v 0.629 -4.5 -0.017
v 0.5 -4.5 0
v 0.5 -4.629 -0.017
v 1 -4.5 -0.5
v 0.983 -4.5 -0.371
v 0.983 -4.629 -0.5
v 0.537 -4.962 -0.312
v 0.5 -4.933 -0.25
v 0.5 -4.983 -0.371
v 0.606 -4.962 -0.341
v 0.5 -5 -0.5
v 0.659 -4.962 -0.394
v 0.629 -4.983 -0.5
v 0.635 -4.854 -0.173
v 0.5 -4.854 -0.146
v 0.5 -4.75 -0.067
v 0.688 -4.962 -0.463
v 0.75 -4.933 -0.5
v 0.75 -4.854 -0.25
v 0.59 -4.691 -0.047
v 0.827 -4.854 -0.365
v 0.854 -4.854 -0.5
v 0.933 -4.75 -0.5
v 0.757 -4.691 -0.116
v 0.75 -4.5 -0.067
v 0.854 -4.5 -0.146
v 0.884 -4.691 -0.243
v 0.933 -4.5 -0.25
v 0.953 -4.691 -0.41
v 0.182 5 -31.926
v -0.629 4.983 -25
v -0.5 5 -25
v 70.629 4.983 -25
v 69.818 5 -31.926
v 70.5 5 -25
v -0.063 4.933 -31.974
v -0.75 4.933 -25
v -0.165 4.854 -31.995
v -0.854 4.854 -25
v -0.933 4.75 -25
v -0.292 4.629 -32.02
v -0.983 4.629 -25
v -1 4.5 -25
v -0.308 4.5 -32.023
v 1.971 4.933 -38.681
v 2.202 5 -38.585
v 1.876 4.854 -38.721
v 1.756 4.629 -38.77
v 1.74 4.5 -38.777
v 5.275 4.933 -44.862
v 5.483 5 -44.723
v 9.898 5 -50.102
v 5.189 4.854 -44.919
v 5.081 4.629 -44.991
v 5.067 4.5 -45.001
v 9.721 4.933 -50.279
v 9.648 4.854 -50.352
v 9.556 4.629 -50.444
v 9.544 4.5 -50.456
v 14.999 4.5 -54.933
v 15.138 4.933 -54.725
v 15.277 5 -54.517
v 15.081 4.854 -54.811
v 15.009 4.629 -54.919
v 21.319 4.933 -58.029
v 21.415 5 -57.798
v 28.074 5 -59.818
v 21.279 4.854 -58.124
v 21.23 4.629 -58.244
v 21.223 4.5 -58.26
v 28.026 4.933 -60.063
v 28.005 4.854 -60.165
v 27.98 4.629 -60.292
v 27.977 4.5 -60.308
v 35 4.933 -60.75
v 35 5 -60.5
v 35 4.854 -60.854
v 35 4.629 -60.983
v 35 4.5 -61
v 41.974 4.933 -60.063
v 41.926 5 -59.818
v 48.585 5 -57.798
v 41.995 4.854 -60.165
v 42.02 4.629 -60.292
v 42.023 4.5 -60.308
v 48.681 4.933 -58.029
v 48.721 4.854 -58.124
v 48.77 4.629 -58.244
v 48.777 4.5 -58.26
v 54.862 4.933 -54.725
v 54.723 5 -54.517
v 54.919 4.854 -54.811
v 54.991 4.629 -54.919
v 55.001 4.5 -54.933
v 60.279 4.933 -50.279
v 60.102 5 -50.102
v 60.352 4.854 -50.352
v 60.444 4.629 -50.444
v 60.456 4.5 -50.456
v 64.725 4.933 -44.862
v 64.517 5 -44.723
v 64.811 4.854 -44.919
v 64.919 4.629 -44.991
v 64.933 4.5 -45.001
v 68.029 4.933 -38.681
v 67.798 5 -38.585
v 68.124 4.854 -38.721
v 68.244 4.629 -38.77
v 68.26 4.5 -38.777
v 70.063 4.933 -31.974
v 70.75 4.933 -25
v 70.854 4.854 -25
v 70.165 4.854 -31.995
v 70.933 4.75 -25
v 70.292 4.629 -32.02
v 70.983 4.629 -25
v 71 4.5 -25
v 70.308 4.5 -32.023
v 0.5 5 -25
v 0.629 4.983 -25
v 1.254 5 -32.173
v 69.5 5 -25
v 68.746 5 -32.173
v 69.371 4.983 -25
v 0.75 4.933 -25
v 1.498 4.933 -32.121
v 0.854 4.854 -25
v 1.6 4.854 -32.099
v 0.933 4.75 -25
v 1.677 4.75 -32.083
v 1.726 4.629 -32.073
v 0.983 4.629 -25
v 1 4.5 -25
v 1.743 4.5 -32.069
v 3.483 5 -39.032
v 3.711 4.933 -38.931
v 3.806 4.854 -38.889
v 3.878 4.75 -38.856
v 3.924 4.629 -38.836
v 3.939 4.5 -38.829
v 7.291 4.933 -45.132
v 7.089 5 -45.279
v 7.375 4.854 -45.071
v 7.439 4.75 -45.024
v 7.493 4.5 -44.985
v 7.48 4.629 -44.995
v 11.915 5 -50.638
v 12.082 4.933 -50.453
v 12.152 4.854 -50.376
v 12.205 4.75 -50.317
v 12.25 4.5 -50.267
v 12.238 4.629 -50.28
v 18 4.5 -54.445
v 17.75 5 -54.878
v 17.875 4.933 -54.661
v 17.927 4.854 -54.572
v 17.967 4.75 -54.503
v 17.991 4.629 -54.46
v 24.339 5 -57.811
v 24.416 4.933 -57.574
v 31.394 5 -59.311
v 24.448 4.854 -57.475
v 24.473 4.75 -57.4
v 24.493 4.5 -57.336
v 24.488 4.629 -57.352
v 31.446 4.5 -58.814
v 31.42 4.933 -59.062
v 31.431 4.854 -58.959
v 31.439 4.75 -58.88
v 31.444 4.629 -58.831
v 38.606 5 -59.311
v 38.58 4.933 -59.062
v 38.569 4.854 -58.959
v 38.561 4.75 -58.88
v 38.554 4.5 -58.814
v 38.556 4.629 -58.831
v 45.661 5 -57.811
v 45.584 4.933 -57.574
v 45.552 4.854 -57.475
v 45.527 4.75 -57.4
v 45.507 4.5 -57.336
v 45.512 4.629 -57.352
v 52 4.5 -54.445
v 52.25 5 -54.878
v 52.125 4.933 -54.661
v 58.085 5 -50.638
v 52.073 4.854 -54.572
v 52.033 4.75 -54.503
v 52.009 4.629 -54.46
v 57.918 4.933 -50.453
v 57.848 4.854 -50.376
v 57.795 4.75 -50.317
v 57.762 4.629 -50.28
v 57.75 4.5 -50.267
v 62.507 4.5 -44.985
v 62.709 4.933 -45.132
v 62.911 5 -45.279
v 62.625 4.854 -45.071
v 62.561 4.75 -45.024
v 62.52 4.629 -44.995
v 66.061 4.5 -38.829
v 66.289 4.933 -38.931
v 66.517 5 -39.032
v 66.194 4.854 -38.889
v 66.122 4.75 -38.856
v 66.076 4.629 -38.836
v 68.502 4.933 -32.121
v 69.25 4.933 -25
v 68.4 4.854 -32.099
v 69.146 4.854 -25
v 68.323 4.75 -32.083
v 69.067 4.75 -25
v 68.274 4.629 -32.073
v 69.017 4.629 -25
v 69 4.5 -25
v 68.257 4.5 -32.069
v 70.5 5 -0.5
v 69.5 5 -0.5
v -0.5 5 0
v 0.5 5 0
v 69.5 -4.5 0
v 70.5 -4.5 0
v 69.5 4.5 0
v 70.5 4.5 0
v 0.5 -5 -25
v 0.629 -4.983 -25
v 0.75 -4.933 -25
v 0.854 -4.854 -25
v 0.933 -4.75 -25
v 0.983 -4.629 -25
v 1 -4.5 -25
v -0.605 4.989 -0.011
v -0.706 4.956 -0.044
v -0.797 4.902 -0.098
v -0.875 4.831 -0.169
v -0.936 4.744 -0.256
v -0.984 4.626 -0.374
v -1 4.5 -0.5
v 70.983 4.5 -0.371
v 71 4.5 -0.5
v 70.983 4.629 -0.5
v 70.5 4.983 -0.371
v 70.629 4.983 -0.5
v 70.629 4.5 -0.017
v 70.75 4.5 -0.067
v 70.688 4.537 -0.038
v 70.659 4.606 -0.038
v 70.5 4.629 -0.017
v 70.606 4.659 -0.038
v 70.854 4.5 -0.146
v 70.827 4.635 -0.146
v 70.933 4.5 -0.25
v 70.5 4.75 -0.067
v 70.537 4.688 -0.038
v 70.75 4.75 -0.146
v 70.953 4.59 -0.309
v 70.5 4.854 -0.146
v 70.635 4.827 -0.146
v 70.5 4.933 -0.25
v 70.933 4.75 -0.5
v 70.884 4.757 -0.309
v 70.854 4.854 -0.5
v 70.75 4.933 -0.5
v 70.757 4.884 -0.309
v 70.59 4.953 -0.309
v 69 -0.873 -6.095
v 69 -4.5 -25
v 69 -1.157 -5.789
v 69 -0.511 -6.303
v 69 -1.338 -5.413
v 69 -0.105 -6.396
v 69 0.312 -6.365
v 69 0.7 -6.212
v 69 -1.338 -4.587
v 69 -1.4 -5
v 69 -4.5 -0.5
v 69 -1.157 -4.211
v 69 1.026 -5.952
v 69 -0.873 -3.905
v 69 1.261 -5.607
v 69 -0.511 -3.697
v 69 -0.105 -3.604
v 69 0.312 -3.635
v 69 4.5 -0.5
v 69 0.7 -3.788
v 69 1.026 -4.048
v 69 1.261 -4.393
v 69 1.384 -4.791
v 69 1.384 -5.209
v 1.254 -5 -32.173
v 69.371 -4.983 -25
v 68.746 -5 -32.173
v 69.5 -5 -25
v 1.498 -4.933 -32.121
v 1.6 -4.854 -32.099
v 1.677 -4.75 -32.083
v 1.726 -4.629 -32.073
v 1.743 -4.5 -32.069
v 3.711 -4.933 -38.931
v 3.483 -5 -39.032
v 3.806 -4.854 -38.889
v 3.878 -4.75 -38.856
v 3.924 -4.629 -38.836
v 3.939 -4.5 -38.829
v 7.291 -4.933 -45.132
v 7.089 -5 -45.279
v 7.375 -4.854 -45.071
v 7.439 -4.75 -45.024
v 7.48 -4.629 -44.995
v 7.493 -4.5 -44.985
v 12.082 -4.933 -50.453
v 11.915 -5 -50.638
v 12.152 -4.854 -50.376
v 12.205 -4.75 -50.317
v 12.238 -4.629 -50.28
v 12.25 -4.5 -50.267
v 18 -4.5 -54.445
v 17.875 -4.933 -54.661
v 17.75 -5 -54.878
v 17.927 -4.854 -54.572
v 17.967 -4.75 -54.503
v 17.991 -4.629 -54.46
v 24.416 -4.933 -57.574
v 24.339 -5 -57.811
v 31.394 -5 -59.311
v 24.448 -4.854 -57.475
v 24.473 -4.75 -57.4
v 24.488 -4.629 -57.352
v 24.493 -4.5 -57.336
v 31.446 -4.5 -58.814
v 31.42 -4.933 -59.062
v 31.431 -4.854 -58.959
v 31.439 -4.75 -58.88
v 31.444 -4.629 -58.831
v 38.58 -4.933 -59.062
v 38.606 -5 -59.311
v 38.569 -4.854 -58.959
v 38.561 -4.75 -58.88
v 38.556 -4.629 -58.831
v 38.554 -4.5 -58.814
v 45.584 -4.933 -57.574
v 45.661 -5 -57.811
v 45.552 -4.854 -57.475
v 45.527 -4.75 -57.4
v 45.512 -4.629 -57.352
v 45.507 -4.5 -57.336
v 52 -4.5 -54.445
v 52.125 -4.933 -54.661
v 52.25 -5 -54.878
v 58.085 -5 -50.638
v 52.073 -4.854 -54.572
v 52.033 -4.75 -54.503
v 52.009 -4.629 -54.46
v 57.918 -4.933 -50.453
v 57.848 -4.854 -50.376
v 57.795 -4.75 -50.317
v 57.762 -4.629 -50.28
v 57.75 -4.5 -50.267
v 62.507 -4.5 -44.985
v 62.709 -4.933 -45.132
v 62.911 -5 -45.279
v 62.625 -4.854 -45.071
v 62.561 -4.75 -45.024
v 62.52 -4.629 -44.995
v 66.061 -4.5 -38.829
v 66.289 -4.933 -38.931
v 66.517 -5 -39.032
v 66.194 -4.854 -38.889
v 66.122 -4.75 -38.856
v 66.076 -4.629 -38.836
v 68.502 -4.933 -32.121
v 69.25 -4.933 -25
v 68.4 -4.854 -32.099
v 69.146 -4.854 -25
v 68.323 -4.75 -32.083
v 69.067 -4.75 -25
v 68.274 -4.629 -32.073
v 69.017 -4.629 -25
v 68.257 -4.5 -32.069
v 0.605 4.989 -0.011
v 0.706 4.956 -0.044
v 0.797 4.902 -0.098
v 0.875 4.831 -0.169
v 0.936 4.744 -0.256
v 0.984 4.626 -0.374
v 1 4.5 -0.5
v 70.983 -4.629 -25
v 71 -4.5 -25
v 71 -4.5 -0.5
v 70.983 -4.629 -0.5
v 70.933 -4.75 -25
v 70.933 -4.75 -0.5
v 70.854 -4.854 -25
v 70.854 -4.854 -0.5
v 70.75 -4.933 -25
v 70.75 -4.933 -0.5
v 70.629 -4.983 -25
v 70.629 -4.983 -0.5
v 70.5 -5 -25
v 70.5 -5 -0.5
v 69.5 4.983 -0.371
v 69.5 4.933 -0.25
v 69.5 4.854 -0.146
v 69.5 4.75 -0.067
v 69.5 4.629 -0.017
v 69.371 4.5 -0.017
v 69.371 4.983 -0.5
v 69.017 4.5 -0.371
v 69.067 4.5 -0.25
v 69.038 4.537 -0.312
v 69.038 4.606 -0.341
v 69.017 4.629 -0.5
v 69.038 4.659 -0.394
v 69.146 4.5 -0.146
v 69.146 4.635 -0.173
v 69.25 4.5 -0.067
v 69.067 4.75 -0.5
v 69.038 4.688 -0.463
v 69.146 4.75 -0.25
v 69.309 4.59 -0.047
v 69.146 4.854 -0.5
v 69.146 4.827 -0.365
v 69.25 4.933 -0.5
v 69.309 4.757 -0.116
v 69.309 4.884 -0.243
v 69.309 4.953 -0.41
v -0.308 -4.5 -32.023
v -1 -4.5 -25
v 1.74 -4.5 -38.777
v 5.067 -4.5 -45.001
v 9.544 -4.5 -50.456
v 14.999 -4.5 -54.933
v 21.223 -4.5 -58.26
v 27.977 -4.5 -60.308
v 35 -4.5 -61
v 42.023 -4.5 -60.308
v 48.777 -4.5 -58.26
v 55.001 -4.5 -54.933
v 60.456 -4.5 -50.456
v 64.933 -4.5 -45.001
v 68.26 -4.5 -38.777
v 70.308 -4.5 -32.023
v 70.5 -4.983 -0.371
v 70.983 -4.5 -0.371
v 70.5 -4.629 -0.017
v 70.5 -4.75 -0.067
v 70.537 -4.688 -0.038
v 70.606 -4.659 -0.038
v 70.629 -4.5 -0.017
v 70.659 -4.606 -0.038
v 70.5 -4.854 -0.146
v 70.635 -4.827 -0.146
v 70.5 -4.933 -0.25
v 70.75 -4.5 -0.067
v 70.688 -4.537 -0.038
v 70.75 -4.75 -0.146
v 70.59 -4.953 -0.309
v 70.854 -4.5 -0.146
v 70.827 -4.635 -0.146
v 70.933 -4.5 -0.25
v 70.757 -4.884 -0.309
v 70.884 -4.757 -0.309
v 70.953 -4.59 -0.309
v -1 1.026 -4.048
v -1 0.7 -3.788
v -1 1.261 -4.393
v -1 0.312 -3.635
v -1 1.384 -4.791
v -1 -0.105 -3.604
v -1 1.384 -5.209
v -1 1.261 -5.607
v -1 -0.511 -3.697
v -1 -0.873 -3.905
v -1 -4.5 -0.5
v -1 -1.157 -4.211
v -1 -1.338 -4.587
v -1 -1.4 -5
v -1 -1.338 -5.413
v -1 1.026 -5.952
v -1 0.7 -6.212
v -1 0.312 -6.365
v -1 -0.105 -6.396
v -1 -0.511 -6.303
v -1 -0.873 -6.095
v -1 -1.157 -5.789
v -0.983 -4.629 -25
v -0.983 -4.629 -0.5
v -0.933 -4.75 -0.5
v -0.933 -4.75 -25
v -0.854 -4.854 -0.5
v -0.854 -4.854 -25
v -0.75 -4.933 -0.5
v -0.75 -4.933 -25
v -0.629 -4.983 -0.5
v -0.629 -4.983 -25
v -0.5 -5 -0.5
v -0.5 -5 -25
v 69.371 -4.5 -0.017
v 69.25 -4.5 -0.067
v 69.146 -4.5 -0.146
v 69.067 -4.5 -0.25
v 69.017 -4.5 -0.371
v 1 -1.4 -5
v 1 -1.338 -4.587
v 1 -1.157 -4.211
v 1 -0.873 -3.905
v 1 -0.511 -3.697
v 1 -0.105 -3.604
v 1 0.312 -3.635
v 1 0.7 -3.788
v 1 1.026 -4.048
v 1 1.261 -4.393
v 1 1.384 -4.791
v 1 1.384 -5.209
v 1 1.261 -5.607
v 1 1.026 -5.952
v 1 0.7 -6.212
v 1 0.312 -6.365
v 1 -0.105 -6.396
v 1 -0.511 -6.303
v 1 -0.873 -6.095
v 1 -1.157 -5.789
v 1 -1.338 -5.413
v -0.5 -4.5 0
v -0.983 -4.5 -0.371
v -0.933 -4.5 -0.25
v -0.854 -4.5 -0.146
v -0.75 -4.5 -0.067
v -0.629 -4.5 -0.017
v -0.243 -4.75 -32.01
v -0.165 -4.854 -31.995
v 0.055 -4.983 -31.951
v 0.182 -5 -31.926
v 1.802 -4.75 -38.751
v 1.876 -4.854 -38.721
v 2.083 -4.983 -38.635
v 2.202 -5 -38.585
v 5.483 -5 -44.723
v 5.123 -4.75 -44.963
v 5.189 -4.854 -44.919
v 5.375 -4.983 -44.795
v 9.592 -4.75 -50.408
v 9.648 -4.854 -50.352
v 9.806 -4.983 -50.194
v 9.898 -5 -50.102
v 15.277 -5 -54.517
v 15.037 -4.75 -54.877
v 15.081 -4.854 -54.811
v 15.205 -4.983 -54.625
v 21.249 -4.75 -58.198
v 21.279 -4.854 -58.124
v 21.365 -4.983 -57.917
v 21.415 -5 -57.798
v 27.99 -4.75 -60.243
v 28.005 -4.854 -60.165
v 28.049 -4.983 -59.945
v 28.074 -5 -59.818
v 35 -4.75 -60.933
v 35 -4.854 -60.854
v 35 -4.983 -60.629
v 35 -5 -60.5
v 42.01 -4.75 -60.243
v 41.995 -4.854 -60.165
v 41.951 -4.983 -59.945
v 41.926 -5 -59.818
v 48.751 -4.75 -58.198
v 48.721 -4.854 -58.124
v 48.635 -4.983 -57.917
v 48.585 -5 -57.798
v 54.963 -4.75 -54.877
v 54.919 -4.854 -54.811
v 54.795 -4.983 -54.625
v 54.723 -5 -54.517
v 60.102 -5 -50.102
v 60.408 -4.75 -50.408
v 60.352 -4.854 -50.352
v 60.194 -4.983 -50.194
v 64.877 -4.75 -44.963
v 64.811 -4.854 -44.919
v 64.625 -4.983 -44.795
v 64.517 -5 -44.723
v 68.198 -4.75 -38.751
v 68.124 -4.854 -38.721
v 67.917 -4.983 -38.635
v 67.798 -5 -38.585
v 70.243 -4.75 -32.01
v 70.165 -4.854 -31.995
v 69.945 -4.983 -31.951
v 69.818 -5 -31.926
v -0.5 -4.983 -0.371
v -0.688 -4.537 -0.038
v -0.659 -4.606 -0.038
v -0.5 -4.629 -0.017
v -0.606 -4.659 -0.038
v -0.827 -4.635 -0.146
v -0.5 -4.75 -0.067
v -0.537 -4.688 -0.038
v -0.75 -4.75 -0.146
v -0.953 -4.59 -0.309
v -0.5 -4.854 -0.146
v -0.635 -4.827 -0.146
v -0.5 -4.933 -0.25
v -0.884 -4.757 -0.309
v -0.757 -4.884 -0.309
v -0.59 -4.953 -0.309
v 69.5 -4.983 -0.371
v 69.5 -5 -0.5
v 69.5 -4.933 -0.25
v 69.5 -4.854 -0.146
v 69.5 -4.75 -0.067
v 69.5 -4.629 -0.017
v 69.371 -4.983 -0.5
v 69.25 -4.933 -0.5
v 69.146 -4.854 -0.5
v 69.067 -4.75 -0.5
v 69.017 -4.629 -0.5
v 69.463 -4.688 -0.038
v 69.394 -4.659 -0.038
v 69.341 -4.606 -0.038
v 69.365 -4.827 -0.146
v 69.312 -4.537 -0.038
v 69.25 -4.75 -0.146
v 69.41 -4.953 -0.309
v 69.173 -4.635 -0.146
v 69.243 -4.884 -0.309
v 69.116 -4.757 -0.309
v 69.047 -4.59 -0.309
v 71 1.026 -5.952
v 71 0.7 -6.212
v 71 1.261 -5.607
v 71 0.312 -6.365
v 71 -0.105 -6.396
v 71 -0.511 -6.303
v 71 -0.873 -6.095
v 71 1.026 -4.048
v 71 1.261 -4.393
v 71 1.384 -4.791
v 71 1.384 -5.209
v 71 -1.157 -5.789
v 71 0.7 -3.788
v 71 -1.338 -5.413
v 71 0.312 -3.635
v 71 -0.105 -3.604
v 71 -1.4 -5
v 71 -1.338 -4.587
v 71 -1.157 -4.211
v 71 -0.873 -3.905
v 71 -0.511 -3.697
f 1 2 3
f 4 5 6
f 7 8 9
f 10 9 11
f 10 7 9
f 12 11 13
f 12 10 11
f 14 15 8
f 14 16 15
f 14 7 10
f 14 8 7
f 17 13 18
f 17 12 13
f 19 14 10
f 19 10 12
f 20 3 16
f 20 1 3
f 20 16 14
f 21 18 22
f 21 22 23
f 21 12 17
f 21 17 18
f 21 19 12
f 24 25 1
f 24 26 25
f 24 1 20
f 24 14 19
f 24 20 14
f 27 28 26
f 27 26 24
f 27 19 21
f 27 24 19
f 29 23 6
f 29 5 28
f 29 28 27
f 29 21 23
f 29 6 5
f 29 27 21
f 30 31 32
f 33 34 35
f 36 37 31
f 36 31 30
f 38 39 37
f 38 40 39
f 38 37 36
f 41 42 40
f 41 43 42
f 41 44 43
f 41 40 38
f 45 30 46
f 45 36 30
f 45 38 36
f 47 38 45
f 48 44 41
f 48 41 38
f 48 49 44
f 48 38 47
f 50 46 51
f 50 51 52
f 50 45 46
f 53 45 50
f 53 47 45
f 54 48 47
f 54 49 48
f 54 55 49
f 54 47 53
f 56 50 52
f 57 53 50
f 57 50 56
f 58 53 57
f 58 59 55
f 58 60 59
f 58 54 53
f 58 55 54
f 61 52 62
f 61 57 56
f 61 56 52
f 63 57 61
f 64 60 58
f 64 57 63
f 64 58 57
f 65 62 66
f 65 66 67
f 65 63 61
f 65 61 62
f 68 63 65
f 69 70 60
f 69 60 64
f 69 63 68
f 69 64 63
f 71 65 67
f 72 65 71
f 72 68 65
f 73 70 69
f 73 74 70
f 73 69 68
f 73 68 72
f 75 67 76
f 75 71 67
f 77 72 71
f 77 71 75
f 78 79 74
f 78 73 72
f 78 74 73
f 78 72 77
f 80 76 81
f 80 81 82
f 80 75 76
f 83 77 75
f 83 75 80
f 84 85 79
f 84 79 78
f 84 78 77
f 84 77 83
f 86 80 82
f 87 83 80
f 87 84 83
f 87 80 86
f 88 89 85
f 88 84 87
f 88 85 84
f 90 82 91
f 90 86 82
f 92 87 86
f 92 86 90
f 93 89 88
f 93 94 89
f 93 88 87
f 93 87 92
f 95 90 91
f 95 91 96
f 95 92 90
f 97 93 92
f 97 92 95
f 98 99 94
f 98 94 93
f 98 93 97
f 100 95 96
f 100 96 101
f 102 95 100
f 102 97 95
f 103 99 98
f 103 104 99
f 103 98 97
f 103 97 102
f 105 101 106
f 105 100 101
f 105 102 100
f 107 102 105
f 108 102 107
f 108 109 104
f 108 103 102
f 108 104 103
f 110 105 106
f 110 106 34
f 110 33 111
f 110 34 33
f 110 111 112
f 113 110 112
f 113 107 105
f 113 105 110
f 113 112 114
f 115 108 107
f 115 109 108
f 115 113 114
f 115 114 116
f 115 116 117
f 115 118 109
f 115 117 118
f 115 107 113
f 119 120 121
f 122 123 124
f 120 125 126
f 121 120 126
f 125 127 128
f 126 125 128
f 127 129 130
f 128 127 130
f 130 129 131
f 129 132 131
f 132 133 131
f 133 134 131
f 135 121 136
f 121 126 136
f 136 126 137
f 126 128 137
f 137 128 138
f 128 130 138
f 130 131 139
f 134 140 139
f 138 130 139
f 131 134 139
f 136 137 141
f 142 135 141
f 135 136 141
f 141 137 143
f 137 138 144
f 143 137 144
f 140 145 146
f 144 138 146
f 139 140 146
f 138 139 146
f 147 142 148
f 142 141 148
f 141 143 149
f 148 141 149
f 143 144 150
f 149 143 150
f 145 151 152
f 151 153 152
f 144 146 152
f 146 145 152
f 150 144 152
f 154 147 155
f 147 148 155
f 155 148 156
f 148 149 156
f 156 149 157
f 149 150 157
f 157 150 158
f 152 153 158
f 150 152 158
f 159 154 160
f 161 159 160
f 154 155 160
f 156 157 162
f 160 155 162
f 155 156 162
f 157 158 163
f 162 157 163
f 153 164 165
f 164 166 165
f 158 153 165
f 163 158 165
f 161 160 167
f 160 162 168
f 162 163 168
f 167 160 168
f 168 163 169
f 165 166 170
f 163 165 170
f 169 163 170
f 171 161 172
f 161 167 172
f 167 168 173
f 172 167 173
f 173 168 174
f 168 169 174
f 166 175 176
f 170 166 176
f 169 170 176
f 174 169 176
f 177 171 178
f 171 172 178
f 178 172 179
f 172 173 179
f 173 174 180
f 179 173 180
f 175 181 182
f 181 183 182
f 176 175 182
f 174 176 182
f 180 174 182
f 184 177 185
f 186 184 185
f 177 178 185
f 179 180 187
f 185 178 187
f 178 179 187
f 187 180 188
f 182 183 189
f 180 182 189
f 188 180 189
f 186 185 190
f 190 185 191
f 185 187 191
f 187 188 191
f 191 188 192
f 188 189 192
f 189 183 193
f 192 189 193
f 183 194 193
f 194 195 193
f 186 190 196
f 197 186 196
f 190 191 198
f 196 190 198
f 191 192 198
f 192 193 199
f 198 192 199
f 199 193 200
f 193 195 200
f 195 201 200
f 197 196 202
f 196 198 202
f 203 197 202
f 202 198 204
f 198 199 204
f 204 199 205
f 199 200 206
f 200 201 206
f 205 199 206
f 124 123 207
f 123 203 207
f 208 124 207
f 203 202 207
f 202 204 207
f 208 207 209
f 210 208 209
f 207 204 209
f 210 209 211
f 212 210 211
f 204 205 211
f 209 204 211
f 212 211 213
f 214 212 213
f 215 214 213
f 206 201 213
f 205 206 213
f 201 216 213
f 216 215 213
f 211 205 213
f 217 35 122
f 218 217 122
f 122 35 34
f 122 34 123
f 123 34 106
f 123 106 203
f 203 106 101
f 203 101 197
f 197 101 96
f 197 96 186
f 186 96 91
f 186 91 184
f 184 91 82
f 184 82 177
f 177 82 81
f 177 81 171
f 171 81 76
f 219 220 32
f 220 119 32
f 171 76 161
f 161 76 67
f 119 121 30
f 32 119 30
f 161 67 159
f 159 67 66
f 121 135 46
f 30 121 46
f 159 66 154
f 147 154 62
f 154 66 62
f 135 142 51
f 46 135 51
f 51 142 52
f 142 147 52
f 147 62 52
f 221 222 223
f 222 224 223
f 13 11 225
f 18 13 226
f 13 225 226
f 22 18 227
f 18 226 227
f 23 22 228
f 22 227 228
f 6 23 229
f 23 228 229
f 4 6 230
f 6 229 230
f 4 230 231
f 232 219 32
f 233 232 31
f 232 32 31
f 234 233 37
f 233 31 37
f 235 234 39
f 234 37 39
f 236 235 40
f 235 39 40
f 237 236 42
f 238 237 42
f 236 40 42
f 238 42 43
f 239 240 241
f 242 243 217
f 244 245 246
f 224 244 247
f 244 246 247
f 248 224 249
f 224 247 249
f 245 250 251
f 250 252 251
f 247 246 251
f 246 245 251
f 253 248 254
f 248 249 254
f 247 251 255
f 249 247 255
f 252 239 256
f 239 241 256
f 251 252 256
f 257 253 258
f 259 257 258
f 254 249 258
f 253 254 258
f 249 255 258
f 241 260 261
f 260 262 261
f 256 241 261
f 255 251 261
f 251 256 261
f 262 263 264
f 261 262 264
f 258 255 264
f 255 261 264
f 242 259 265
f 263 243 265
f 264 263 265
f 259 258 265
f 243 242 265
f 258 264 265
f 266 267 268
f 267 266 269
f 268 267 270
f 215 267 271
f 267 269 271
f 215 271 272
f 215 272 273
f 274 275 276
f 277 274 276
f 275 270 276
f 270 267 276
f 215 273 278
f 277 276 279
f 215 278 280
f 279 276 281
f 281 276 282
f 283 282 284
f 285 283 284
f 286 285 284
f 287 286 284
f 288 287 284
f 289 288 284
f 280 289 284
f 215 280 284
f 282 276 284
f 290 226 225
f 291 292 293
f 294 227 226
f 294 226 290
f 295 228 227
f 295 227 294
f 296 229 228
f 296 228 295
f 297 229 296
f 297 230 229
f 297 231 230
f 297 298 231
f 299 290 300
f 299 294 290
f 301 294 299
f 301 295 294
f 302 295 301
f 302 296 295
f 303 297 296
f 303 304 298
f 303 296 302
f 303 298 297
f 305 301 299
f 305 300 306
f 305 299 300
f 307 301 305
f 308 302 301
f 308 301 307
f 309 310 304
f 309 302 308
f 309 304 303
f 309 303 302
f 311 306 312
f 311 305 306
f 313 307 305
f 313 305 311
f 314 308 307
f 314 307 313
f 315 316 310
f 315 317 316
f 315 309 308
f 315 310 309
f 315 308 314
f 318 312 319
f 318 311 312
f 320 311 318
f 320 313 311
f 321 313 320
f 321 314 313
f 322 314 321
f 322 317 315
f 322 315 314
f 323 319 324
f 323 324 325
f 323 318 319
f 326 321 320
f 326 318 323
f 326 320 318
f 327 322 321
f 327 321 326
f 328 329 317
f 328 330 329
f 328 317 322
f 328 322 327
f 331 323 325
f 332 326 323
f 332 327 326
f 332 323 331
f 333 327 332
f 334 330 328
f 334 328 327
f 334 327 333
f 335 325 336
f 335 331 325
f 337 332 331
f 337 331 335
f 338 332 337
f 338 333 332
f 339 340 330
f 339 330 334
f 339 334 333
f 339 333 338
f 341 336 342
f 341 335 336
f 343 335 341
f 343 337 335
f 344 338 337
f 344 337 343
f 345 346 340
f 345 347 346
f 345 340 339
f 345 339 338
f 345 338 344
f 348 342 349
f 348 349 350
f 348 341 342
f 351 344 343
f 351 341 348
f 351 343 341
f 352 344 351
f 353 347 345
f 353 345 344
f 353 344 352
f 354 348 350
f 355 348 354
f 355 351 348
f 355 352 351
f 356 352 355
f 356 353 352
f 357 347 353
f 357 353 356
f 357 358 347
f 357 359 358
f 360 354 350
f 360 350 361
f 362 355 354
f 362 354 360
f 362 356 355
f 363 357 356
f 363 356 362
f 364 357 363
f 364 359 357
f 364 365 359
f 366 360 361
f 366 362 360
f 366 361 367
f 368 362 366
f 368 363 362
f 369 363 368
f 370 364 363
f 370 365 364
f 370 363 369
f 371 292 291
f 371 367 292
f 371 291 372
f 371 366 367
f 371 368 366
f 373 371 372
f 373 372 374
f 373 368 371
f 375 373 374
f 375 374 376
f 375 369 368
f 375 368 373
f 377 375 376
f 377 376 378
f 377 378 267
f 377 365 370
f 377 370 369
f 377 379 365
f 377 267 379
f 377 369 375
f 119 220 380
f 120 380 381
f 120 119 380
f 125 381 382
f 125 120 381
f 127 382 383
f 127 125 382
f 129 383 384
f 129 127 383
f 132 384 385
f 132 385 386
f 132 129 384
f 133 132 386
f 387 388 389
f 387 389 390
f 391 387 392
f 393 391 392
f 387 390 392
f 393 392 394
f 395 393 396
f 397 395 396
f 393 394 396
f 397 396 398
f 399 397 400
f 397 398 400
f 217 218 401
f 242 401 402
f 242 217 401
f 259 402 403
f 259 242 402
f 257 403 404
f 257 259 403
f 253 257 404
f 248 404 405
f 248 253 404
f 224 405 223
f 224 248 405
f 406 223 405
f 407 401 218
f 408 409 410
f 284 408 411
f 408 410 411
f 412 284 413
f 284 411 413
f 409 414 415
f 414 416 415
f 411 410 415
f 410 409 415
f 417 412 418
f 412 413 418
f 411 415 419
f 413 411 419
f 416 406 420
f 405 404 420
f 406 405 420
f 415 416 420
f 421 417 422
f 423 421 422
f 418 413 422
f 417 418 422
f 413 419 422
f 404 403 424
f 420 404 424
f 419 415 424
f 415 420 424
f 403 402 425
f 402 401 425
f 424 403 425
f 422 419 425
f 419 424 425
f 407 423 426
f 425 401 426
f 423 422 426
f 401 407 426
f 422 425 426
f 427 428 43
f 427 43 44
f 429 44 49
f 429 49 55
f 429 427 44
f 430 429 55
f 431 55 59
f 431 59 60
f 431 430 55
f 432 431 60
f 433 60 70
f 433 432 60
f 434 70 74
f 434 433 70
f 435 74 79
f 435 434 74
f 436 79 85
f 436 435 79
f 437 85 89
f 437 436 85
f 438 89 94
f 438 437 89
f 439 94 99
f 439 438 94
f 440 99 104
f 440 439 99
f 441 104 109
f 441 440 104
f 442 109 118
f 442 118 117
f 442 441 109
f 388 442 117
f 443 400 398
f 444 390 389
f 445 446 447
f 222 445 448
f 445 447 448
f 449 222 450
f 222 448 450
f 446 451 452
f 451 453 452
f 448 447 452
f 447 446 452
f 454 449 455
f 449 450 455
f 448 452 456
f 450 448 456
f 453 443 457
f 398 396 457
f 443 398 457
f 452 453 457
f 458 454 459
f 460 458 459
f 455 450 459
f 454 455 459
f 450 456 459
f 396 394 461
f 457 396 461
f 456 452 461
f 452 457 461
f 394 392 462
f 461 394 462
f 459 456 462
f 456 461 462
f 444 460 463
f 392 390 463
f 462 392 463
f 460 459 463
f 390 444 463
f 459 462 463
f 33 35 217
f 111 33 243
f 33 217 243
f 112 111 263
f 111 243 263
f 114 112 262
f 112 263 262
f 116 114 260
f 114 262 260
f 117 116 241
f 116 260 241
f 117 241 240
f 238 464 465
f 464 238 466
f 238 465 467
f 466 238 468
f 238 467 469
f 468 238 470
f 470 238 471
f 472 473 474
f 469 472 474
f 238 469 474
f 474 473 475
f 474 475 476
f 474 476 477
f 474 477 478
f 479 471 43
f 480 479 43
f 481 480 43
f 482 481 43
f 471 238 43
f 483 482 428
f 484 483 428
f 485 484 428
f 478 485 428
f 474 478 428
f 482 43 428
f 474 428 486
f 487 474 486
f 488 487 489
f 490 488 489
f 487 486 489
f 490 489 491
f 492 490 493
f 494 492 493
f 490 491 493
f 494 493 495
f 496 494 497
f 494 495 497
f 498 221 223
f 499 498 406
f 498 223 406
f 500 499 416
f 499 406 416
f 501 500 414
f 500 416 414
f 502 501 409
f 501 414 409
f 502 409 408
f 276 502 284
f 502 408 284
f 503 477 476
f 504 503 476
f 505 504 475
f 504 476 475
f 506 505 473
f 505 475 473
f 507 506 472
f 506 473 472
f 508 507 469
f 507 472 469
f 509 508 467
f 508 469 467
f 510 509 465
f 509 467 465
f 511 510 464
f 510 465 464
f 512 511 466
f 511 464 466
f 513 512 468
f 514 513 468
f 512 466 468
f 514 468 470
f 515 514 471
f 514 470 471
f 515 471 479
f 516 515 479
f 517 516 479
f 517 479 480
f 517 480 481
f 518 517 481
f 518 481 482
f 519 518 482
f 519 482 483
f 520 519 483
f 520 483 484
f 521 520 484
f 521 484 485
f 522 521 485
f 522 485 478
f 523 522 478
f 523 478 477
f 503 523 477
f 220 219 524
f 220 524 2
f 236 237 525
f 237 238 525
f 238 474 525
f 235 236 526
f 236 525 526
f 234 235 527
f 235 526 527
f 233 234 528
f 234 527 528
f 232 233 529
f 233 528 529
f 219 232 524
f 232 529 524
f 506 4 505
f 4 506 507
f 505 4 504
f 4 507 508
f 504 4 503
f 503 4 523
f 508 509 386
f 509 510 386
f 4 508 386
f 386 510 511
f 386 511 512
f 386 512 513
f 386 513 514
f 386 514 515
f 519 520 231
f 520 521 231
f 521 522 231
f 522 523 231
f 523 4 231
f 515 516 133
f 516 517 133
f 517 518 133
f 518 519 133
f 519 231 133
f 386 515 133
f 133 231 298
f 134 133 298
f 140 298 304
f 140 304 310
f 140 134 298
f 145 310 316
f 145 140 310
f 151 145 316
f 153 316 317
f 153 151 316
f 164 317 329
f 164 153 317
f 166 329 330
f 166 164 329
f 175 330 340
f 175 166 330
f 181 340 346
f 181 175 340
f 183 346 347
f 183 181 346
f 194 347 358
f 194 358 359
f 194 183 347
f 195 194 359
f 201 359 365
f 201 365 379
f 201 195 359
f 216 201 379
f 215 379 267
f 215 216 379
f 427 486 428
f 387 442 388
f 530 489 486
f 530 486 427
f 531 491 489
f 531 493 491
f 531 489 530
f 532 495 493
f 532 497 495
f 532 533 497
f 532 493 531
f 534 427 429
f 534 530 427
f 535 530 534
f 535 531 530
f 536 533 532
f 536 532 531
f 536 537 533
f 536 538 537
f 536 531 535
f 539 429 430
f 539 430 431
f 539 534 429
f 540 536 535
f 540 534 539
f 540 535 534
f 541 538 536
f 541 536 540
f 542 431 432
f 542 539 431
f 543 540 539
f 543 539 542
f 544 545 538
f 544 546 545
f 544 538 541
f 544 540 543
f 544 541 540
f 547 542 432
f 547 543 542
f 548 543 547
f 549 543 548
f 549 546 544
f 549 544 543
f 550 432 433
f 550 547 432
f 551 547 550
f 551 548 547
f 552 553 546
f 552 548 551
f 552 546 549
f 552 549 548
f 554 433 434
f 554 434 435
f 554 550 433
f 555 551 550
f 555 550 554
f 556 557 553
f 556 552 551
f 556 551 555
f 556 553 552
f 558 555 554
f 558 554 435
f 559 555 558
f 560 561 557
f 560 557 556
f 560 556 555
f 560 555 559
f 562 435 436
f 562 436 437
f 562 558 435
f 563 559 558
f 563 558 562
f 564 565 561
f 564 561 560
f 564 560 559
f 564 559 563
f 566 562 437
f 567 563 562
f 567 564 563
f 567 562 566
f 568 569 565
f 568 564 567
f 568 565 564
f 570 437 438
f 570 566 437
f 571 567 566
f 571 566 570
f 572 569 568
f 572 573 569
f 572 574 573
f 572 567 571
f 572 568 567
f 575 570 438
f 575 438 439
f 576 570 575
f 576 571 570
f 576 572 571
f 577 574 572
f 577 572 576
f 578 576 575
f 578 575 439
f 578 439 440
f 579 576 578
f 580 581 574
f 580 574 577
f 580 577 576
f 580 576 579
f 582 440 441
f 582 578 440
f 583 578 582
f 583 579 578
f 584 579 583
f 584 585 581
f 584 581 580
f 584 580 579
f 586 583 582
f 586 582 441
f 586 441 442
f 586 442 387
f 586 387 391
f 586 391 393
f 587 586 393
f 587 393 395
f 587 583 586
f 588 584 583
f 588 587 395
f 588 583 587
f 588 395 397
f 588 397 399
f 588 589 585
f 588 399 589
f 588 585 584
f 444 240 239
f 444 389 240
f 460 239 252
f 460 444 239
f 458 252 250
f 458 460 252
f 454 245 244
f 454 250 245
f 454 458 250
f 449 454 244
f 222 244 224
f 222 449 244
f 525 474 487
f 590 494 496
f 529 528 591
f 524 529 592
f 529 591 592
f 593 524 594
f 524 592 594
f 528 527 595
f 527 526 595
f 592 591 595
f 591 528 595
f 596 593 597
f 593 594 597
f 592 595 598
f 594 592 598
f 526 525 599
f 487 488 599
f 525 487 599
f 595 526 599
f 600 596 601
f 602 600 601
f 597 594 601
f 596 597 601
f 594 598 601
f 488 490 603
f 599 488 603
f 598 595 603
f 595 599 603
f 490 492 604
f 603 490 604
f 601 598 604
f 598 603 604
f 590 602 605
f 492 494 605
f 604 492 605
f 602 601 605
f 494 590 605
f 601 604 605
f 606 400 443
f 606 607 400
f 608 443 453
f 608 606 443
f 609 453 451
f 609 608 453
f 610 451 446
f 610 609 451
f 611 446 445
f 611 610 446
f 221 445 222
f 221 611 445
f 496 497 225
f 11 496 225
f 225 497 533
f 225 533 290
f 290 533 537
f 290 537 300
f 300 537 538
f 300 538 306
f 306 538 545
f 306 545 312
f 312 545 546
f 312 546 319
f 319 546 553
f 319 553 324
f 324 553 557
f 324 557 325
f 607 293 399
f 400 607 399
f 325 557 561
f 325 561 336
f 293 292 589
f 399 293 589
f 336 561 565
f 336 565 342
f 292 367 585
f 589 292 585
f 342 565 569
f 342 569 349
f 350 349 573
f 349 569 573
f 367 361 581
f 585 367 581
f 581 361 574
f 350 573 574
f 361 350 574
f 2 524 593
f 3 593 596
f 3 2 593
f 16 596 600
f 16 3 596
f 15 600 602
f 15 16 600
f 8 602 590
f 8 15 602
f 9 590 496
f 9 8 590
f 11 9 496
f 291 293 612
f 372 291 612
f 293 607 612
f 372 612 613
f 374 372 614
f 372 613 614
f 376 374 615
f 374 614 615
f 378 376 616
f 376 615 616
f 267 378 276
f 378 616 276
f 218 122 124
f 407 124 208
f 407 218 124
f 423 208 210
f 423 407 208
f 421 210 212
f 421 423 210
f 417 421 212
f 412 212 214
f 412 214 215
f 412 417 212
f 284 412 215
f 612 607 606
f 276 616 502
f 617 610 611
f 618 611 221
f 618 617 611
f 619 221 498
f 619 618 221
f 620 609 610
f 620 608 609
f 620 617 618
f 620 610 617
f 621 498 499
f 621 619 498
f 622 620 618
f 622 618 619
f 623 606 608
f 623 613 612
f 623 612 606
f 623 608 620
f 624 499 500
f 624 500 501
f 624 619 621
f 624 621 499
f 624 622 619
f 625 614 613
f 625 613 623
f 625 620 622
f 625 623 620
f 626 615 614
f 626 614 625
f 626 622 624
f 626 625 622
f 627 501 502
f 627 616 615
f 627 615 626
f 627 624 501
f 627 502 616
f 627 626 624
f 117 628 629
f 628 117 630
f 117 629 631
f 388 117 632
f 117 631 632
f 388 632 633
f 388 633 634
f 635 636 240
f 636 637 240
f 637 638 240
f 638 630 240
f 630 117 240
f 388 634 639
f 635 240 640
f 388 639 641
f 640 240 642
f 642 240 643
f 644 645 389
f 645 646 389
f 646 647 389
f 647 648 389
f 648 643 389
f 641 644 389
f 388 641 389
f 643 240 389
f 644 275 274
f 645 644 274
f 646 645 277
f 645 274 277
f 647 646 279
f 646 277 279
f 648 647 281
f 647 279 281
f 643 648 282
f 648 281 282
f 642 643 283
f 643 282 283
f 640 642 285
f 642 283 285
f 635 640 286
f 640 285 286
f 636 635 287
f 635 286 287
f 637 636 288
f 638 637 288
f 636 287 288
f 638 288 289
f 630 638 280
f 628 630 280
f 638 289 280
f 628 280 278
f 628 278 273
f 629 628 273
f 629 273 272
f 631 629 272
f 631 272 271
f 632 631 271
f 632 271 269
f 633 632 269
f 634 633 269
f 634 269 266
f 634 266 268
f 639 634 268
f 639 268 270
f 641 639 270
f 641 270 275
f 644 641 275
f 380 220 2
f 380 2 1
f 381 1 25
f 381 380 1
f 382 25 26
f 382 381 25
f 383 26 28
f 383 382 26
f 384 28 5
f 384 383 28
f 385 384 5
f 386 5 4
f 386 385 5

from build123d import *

# Parameters (mm, degrees)
SZKIC3_W                   = 2
SZKIC3_H                   = 10
SZKIC5_R                   = 1.4
WYTNIJ_WYCI_GNI_CIE1_DEPTH = 100
ZAOKR_GLENIE1_R            = 0.5


with BuildPart() as part:
    # Wyciągnięcie po ścieżce1: sweep along a path in Szkic2
    with BuildLine(Plane(origin=(0, 0, 0), x_dir=(1, 0, 0), z_dir=(0, 1, 0))) as wyci_gni_cie_po_cie_ce1_path:
        Line((0, 0), (0, 25))
        ThreePointArc((0, 25), (35, 60), (70, 25))
        Line((70, 25), (70, 0))
    # Szkic3 → Wyciągnięcie po ścieżce1 (sweep)
    with BuildSketch(Plane.XY):
        Rectangle(SZKIC3_W, SZKIC3_H)
    sweep(path=wyci_gni_cie_po_cie_ce1_path.line)

    # Szkic5 → Wytnij-wyciągnięcie1 (cut)
    with BuildSketch(Plane.ZY.offset(1)):
        with Locations(Location((-5, 0, 0), (0, 0, 270))):
            Circle(SZKIC5_R)
    extrude(amount=-WYTNIJ_WYCI_GNI_CIE1_DEPTH, mode=Mode.SUBTRACT)

    # Zaokrąglenie1
    zaokr_glenie1_edges = [part.edges().sort_by_distance(p)[0] for p in [
        (35, -5, -61),
        (35, 5, -61),
        (1, 0, 0),
        (-1, 0, 0),
        (0, -5, 0),
        (1, -5, -12.5),
        (35, -5, -59),
        (70, -5, 0),
        (71, -5, -12.5),
        (71, 0, 0),
        (71, 5, -12.5),
        (70, 5, 0),
        (69, 0, 0),
        (69, -5, -12.5),
        (69, 5, -12.5),
        (-1, -5, -12.5),
        (35, 5, -59),
        (1, 5, -12.5),
        (-1, 5, -12.5),
    ]]
    fillet(zaokr_glenie1_edges, radius=ZAOKR_GLENIE1_R)


solid = part.part
